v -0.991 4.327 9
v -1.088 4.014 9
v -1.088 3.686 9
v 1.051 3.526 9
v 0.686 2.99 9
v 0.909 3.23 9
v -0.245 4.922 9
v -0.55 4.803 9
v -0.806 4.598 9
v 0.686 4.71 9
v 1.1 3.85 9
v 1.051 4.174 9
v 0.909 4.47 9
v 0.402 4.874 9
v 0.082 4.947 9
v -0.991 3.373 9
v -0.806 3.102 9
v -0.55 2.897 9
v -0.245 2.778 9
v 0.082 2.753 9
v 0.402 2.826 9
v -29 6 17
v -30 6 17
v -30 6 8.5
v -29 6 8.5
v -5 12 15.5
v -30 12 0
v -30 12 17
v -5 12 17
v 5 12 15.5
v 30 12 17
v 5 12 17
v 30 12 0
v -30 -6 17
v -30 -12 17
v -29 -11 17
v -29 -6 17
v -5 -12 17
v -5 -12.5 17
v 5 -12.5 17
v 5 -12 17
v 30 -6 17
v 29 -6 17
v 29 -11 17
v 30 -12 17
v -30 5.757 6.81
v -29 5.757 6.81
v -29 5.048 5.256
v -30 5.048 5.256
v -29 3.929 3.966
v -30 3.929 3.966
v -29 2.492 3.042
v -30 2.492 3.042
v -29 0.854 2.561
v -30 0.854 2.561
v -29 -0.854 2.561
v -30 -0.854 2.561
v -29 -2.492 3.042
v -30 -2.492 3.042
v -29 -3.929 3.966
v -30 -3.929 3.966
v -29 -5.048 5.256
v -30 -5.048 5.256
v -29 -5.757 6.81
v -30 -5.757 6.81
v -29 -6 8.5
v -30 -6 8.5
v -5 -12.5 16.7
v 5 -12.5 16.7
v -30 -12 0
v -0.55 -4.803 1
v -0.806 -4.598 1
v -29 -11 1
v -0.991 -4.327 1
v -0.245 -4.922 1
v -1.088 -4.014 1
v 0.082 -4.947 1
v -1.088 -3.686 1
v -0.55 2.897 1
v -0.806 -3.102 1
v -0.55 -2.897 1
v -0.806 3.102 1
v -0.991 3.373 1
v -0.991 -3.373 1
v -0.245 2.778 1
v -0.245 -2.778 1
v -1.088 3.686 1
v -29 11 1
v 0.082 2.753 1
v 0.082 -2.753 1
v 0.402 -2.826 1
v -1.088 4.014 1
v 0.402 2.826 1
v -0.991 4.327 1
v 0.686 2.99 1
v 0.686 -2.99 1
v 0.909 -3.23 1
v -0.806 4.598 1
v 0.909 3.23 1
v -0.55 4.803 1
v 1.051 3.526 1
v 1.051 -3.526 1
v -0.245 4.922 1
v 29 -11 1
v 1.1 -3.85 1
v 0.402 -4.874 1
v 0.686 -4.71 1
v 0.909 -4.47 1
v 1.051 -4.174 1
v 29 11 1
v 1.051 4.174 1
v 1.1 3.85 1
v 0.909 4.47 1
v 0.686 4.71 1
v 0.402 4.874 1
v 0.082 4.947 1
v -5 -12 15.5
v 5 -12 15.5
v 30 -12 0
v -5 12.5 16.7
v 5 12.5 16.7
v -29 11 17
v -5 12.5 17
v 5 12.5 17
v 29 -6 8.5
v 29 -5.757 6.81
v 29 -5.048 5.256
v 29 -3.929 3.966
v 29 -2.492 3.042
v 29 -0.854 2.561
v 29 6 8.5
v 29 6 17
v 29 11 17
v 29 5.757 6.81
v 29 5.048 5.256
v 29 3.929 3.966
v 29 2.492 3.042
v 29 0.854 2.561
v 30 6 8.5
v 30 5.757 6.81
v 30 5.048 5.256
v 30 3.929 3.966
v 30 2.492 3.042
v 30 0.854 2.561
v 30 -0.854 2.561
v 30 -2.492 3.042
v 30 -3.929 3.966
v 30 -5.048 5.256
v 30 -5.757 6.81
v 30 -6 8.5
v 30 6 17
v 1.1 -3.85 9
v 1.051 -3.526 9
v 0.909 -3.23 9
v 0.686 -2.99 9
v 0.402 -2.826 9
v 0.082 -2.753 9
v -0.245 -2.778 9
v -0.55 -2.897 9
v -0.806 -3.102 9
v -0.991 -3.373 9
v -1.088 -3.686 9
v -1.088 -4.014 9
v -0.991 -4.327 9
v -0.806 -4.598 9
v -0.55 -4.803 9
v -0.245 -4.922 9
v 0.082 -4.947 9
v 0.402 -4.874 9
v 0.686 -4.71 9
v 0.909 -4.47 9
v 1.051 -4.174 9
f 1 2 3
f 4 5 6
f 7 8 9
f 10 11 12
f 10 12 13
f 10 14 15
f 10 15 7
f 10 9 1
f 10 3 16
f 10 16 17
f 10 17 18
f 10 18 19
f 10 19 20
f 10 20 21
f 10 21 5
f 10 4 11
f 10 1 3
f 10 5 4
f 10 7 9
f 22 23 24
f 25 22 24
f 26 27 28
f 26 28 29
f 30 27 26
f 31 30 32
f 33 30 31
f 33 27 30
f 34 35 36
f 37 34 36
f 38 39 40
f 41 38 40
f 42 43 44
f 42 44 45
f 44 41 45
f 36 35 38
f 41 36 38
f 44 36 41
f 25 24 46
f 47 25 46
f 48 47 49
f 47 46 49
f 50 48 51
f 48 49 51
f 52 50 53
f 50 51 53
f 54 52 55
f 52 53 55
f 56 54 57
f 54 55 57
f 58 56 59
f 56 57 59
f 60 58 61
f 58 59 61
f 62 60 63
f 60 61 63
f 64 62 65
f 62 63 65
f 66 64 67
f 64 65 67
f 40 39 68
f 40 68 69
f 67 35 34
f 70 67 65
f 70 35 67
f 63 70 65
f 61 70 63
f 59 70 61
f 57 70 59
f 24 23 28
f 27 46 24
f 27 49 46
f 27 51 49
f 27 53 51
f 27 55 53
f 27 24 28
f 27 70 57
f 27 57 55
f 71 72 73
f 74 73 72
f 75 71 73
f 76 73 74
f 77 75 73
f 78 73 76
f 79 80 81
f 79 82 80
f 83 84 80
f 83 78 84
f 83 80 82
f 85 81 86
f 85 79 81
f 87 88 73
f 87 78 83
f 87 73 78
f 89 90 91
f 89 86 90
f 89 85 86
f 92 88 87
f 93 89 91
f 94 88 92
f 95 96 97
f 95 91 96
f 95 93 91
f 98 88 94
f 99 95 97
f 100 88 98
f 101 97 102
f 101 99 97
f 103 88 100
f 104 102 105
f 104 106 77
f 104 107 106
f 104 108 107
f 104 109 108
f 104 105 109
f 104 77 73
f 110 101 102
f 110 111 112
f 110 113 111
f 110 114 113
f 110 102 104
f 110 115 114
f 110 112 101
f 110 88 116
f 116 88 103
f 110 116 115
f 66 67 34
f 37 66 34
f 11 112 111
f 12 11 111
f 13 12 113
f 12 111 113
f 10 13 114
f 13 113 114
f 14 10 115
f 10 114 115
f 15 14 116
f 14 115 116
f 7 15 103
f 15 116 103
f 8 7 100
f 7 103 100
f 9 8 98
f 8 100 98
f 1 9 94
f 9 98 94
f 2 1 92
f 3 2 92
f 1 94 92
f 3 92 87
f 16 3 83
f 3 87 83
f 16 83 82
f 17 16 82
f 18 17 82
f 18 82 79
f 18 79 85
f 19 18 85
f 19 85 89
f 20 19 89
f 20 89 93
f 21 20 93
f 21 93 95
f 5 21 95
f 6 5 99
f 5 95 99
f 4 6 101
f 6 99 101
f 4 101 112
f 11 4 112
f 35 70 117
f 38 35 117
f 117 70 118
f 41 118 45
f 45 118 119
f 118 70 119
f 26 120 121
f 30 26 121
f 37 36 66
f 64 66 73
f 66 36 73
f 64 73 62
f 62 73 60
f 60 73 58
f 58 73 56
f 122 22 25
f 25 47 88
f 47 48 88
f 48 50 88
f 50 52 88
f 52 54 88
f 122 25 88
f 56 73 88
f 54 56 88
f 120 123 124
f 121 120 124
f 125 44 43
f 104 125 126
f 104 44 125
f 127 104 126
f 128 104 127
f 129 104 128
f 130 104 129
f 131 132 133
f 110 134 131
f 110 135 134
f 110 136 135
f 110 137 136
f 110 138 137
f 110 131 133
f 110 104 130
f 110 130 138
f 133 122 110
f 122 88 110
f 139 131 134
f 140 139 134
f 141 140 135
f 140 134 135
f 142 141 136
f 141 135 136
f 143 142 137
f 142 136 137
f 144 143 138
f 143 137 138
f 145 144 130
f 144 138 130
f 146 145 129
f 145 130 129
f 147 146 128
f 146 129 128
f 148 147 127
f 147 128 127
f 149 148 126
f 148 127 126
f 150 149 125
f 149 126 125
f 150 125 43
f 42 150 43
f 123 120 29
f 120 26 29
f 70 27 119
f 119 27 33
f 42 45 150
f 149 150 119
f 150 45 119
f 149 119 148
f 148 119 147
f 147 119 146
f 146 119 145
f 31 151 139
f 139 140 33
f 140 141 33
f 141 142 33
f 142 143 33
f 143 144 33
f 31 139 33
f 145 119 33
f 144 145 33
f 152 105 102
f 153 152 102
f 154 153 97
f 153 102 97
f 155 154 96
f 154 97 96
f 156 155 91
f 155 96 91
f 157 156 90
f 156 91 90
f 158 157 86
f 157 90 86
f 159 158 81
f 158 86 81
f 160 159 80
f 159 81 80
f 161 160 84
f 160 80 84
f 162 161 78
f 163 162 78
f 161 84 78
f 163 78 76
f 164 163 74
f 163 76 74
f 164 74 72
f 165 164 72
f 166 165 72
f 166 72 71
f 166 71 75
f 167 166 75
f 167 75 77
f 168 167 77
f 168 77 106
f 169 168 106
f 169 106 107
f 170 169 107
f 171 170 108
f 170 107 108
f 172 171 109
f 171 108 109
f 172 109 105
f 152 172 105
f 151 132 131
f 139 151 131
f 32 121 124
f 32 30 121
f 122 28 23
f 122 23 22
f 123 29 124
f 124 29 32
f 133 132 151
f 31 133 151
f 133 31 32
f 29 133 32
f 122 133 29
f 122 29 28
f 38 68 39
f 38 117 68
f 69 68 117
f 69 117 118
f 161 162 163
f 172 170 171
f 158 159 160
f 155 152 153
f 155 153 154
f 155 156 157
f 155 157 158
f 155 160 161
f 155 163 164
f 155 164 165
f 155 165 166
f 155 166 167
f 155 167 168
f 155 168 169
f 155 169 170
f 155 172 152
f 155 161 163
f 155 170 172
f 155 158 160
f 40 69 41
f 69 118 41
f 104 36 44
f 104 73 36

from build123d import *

# Parameters (mm, degrees)
F0_W      = 60
F0_H      = 24
F1_DEPTH  = 17
F2_T      = -1
F3_W      = 10
F3_H      = 1.5
F4_DEPTH  = 0.5
F5_SIZE2  = 1.19999
F5_SIZE   = 0.49999
F8_DEPTH  = 60.001
F9_R      = 1.1
F10_DEPTH = 8


# Not quite as in the source:
# - a fillet or chamfer is up to 0.001 mm smaller than in the source, because OpenCascade refuses the exact size


with BuildPart() as f1:
    # F0 (on Top) → F1 (new body)
    with BuildSketch(Plane.XY):
        Rectangle(F0_W, F0_H)
    extrude(amount=F1_DEPTH)

    # F2
    f2_openings = [f1.faces().sort_by_distance(p)[0] for p in [
        (0, 0, 17),
    ]]
    offset(amount=F2_T, openings=f2_openings)

    # F3 (on face) → F4 (join)
    with BuildSketch(Plane.XZ.offset(12)):
        with Locations((0, 16.25)):
            Rectangle(F3_W, F3_H)
    extrude(amount=F4_DEPTH)

    # F5 (size 0.5 and 1.2 in the source; OpenCascade refuses exactly that, so slightly less here)
    f5_edges = [f1.edges().sort_by_distance(p)[0] for p in [
        (0, -12.5, 15.5),
    ]]
    f5_side = f1.faces().sort_by_distance((0, -12.25, 15.5))[0]
    chamfer(f5_edges, length=F5_SIZE, length2=F5_SIZE2, reference=f5_side)

    # F6: F1 across plane


with BuildPart() as f1_1:
    add(f1.part)
    add(f1.part.mirror(Plane.XZ))

    # F7 (on face) → F8 (cut, through all)
    with BuildSketch(Plane(origin=(-30, 0, 0), x_dir=(0, -1, 0), z_dir=(-1, 0, 0))):
        with BuildLine():
            Line((-6, 17), (-6, 8.5))
            ThreePointArc((-6, 8.5), (0, 2.5), (6, 8.5))
            Line((6, 8.5), (6, 17))
            Line((6, 17), (-6, 17))
        make_face()
    extrude(amount=-F8_DEPTH, mode=Mode.SUBTRACT)

    # F9 (on face) → F10 (join)
    with BuildSketch(Plane.XY.offset(1)):
        with Locations((0, 3.85)):
            Circle(F9_R)
        with Locations((0, -3.85)):
            Circle(F9_R)
    extrude(amount=F10_DEPTH)


solid = f1_1.part
